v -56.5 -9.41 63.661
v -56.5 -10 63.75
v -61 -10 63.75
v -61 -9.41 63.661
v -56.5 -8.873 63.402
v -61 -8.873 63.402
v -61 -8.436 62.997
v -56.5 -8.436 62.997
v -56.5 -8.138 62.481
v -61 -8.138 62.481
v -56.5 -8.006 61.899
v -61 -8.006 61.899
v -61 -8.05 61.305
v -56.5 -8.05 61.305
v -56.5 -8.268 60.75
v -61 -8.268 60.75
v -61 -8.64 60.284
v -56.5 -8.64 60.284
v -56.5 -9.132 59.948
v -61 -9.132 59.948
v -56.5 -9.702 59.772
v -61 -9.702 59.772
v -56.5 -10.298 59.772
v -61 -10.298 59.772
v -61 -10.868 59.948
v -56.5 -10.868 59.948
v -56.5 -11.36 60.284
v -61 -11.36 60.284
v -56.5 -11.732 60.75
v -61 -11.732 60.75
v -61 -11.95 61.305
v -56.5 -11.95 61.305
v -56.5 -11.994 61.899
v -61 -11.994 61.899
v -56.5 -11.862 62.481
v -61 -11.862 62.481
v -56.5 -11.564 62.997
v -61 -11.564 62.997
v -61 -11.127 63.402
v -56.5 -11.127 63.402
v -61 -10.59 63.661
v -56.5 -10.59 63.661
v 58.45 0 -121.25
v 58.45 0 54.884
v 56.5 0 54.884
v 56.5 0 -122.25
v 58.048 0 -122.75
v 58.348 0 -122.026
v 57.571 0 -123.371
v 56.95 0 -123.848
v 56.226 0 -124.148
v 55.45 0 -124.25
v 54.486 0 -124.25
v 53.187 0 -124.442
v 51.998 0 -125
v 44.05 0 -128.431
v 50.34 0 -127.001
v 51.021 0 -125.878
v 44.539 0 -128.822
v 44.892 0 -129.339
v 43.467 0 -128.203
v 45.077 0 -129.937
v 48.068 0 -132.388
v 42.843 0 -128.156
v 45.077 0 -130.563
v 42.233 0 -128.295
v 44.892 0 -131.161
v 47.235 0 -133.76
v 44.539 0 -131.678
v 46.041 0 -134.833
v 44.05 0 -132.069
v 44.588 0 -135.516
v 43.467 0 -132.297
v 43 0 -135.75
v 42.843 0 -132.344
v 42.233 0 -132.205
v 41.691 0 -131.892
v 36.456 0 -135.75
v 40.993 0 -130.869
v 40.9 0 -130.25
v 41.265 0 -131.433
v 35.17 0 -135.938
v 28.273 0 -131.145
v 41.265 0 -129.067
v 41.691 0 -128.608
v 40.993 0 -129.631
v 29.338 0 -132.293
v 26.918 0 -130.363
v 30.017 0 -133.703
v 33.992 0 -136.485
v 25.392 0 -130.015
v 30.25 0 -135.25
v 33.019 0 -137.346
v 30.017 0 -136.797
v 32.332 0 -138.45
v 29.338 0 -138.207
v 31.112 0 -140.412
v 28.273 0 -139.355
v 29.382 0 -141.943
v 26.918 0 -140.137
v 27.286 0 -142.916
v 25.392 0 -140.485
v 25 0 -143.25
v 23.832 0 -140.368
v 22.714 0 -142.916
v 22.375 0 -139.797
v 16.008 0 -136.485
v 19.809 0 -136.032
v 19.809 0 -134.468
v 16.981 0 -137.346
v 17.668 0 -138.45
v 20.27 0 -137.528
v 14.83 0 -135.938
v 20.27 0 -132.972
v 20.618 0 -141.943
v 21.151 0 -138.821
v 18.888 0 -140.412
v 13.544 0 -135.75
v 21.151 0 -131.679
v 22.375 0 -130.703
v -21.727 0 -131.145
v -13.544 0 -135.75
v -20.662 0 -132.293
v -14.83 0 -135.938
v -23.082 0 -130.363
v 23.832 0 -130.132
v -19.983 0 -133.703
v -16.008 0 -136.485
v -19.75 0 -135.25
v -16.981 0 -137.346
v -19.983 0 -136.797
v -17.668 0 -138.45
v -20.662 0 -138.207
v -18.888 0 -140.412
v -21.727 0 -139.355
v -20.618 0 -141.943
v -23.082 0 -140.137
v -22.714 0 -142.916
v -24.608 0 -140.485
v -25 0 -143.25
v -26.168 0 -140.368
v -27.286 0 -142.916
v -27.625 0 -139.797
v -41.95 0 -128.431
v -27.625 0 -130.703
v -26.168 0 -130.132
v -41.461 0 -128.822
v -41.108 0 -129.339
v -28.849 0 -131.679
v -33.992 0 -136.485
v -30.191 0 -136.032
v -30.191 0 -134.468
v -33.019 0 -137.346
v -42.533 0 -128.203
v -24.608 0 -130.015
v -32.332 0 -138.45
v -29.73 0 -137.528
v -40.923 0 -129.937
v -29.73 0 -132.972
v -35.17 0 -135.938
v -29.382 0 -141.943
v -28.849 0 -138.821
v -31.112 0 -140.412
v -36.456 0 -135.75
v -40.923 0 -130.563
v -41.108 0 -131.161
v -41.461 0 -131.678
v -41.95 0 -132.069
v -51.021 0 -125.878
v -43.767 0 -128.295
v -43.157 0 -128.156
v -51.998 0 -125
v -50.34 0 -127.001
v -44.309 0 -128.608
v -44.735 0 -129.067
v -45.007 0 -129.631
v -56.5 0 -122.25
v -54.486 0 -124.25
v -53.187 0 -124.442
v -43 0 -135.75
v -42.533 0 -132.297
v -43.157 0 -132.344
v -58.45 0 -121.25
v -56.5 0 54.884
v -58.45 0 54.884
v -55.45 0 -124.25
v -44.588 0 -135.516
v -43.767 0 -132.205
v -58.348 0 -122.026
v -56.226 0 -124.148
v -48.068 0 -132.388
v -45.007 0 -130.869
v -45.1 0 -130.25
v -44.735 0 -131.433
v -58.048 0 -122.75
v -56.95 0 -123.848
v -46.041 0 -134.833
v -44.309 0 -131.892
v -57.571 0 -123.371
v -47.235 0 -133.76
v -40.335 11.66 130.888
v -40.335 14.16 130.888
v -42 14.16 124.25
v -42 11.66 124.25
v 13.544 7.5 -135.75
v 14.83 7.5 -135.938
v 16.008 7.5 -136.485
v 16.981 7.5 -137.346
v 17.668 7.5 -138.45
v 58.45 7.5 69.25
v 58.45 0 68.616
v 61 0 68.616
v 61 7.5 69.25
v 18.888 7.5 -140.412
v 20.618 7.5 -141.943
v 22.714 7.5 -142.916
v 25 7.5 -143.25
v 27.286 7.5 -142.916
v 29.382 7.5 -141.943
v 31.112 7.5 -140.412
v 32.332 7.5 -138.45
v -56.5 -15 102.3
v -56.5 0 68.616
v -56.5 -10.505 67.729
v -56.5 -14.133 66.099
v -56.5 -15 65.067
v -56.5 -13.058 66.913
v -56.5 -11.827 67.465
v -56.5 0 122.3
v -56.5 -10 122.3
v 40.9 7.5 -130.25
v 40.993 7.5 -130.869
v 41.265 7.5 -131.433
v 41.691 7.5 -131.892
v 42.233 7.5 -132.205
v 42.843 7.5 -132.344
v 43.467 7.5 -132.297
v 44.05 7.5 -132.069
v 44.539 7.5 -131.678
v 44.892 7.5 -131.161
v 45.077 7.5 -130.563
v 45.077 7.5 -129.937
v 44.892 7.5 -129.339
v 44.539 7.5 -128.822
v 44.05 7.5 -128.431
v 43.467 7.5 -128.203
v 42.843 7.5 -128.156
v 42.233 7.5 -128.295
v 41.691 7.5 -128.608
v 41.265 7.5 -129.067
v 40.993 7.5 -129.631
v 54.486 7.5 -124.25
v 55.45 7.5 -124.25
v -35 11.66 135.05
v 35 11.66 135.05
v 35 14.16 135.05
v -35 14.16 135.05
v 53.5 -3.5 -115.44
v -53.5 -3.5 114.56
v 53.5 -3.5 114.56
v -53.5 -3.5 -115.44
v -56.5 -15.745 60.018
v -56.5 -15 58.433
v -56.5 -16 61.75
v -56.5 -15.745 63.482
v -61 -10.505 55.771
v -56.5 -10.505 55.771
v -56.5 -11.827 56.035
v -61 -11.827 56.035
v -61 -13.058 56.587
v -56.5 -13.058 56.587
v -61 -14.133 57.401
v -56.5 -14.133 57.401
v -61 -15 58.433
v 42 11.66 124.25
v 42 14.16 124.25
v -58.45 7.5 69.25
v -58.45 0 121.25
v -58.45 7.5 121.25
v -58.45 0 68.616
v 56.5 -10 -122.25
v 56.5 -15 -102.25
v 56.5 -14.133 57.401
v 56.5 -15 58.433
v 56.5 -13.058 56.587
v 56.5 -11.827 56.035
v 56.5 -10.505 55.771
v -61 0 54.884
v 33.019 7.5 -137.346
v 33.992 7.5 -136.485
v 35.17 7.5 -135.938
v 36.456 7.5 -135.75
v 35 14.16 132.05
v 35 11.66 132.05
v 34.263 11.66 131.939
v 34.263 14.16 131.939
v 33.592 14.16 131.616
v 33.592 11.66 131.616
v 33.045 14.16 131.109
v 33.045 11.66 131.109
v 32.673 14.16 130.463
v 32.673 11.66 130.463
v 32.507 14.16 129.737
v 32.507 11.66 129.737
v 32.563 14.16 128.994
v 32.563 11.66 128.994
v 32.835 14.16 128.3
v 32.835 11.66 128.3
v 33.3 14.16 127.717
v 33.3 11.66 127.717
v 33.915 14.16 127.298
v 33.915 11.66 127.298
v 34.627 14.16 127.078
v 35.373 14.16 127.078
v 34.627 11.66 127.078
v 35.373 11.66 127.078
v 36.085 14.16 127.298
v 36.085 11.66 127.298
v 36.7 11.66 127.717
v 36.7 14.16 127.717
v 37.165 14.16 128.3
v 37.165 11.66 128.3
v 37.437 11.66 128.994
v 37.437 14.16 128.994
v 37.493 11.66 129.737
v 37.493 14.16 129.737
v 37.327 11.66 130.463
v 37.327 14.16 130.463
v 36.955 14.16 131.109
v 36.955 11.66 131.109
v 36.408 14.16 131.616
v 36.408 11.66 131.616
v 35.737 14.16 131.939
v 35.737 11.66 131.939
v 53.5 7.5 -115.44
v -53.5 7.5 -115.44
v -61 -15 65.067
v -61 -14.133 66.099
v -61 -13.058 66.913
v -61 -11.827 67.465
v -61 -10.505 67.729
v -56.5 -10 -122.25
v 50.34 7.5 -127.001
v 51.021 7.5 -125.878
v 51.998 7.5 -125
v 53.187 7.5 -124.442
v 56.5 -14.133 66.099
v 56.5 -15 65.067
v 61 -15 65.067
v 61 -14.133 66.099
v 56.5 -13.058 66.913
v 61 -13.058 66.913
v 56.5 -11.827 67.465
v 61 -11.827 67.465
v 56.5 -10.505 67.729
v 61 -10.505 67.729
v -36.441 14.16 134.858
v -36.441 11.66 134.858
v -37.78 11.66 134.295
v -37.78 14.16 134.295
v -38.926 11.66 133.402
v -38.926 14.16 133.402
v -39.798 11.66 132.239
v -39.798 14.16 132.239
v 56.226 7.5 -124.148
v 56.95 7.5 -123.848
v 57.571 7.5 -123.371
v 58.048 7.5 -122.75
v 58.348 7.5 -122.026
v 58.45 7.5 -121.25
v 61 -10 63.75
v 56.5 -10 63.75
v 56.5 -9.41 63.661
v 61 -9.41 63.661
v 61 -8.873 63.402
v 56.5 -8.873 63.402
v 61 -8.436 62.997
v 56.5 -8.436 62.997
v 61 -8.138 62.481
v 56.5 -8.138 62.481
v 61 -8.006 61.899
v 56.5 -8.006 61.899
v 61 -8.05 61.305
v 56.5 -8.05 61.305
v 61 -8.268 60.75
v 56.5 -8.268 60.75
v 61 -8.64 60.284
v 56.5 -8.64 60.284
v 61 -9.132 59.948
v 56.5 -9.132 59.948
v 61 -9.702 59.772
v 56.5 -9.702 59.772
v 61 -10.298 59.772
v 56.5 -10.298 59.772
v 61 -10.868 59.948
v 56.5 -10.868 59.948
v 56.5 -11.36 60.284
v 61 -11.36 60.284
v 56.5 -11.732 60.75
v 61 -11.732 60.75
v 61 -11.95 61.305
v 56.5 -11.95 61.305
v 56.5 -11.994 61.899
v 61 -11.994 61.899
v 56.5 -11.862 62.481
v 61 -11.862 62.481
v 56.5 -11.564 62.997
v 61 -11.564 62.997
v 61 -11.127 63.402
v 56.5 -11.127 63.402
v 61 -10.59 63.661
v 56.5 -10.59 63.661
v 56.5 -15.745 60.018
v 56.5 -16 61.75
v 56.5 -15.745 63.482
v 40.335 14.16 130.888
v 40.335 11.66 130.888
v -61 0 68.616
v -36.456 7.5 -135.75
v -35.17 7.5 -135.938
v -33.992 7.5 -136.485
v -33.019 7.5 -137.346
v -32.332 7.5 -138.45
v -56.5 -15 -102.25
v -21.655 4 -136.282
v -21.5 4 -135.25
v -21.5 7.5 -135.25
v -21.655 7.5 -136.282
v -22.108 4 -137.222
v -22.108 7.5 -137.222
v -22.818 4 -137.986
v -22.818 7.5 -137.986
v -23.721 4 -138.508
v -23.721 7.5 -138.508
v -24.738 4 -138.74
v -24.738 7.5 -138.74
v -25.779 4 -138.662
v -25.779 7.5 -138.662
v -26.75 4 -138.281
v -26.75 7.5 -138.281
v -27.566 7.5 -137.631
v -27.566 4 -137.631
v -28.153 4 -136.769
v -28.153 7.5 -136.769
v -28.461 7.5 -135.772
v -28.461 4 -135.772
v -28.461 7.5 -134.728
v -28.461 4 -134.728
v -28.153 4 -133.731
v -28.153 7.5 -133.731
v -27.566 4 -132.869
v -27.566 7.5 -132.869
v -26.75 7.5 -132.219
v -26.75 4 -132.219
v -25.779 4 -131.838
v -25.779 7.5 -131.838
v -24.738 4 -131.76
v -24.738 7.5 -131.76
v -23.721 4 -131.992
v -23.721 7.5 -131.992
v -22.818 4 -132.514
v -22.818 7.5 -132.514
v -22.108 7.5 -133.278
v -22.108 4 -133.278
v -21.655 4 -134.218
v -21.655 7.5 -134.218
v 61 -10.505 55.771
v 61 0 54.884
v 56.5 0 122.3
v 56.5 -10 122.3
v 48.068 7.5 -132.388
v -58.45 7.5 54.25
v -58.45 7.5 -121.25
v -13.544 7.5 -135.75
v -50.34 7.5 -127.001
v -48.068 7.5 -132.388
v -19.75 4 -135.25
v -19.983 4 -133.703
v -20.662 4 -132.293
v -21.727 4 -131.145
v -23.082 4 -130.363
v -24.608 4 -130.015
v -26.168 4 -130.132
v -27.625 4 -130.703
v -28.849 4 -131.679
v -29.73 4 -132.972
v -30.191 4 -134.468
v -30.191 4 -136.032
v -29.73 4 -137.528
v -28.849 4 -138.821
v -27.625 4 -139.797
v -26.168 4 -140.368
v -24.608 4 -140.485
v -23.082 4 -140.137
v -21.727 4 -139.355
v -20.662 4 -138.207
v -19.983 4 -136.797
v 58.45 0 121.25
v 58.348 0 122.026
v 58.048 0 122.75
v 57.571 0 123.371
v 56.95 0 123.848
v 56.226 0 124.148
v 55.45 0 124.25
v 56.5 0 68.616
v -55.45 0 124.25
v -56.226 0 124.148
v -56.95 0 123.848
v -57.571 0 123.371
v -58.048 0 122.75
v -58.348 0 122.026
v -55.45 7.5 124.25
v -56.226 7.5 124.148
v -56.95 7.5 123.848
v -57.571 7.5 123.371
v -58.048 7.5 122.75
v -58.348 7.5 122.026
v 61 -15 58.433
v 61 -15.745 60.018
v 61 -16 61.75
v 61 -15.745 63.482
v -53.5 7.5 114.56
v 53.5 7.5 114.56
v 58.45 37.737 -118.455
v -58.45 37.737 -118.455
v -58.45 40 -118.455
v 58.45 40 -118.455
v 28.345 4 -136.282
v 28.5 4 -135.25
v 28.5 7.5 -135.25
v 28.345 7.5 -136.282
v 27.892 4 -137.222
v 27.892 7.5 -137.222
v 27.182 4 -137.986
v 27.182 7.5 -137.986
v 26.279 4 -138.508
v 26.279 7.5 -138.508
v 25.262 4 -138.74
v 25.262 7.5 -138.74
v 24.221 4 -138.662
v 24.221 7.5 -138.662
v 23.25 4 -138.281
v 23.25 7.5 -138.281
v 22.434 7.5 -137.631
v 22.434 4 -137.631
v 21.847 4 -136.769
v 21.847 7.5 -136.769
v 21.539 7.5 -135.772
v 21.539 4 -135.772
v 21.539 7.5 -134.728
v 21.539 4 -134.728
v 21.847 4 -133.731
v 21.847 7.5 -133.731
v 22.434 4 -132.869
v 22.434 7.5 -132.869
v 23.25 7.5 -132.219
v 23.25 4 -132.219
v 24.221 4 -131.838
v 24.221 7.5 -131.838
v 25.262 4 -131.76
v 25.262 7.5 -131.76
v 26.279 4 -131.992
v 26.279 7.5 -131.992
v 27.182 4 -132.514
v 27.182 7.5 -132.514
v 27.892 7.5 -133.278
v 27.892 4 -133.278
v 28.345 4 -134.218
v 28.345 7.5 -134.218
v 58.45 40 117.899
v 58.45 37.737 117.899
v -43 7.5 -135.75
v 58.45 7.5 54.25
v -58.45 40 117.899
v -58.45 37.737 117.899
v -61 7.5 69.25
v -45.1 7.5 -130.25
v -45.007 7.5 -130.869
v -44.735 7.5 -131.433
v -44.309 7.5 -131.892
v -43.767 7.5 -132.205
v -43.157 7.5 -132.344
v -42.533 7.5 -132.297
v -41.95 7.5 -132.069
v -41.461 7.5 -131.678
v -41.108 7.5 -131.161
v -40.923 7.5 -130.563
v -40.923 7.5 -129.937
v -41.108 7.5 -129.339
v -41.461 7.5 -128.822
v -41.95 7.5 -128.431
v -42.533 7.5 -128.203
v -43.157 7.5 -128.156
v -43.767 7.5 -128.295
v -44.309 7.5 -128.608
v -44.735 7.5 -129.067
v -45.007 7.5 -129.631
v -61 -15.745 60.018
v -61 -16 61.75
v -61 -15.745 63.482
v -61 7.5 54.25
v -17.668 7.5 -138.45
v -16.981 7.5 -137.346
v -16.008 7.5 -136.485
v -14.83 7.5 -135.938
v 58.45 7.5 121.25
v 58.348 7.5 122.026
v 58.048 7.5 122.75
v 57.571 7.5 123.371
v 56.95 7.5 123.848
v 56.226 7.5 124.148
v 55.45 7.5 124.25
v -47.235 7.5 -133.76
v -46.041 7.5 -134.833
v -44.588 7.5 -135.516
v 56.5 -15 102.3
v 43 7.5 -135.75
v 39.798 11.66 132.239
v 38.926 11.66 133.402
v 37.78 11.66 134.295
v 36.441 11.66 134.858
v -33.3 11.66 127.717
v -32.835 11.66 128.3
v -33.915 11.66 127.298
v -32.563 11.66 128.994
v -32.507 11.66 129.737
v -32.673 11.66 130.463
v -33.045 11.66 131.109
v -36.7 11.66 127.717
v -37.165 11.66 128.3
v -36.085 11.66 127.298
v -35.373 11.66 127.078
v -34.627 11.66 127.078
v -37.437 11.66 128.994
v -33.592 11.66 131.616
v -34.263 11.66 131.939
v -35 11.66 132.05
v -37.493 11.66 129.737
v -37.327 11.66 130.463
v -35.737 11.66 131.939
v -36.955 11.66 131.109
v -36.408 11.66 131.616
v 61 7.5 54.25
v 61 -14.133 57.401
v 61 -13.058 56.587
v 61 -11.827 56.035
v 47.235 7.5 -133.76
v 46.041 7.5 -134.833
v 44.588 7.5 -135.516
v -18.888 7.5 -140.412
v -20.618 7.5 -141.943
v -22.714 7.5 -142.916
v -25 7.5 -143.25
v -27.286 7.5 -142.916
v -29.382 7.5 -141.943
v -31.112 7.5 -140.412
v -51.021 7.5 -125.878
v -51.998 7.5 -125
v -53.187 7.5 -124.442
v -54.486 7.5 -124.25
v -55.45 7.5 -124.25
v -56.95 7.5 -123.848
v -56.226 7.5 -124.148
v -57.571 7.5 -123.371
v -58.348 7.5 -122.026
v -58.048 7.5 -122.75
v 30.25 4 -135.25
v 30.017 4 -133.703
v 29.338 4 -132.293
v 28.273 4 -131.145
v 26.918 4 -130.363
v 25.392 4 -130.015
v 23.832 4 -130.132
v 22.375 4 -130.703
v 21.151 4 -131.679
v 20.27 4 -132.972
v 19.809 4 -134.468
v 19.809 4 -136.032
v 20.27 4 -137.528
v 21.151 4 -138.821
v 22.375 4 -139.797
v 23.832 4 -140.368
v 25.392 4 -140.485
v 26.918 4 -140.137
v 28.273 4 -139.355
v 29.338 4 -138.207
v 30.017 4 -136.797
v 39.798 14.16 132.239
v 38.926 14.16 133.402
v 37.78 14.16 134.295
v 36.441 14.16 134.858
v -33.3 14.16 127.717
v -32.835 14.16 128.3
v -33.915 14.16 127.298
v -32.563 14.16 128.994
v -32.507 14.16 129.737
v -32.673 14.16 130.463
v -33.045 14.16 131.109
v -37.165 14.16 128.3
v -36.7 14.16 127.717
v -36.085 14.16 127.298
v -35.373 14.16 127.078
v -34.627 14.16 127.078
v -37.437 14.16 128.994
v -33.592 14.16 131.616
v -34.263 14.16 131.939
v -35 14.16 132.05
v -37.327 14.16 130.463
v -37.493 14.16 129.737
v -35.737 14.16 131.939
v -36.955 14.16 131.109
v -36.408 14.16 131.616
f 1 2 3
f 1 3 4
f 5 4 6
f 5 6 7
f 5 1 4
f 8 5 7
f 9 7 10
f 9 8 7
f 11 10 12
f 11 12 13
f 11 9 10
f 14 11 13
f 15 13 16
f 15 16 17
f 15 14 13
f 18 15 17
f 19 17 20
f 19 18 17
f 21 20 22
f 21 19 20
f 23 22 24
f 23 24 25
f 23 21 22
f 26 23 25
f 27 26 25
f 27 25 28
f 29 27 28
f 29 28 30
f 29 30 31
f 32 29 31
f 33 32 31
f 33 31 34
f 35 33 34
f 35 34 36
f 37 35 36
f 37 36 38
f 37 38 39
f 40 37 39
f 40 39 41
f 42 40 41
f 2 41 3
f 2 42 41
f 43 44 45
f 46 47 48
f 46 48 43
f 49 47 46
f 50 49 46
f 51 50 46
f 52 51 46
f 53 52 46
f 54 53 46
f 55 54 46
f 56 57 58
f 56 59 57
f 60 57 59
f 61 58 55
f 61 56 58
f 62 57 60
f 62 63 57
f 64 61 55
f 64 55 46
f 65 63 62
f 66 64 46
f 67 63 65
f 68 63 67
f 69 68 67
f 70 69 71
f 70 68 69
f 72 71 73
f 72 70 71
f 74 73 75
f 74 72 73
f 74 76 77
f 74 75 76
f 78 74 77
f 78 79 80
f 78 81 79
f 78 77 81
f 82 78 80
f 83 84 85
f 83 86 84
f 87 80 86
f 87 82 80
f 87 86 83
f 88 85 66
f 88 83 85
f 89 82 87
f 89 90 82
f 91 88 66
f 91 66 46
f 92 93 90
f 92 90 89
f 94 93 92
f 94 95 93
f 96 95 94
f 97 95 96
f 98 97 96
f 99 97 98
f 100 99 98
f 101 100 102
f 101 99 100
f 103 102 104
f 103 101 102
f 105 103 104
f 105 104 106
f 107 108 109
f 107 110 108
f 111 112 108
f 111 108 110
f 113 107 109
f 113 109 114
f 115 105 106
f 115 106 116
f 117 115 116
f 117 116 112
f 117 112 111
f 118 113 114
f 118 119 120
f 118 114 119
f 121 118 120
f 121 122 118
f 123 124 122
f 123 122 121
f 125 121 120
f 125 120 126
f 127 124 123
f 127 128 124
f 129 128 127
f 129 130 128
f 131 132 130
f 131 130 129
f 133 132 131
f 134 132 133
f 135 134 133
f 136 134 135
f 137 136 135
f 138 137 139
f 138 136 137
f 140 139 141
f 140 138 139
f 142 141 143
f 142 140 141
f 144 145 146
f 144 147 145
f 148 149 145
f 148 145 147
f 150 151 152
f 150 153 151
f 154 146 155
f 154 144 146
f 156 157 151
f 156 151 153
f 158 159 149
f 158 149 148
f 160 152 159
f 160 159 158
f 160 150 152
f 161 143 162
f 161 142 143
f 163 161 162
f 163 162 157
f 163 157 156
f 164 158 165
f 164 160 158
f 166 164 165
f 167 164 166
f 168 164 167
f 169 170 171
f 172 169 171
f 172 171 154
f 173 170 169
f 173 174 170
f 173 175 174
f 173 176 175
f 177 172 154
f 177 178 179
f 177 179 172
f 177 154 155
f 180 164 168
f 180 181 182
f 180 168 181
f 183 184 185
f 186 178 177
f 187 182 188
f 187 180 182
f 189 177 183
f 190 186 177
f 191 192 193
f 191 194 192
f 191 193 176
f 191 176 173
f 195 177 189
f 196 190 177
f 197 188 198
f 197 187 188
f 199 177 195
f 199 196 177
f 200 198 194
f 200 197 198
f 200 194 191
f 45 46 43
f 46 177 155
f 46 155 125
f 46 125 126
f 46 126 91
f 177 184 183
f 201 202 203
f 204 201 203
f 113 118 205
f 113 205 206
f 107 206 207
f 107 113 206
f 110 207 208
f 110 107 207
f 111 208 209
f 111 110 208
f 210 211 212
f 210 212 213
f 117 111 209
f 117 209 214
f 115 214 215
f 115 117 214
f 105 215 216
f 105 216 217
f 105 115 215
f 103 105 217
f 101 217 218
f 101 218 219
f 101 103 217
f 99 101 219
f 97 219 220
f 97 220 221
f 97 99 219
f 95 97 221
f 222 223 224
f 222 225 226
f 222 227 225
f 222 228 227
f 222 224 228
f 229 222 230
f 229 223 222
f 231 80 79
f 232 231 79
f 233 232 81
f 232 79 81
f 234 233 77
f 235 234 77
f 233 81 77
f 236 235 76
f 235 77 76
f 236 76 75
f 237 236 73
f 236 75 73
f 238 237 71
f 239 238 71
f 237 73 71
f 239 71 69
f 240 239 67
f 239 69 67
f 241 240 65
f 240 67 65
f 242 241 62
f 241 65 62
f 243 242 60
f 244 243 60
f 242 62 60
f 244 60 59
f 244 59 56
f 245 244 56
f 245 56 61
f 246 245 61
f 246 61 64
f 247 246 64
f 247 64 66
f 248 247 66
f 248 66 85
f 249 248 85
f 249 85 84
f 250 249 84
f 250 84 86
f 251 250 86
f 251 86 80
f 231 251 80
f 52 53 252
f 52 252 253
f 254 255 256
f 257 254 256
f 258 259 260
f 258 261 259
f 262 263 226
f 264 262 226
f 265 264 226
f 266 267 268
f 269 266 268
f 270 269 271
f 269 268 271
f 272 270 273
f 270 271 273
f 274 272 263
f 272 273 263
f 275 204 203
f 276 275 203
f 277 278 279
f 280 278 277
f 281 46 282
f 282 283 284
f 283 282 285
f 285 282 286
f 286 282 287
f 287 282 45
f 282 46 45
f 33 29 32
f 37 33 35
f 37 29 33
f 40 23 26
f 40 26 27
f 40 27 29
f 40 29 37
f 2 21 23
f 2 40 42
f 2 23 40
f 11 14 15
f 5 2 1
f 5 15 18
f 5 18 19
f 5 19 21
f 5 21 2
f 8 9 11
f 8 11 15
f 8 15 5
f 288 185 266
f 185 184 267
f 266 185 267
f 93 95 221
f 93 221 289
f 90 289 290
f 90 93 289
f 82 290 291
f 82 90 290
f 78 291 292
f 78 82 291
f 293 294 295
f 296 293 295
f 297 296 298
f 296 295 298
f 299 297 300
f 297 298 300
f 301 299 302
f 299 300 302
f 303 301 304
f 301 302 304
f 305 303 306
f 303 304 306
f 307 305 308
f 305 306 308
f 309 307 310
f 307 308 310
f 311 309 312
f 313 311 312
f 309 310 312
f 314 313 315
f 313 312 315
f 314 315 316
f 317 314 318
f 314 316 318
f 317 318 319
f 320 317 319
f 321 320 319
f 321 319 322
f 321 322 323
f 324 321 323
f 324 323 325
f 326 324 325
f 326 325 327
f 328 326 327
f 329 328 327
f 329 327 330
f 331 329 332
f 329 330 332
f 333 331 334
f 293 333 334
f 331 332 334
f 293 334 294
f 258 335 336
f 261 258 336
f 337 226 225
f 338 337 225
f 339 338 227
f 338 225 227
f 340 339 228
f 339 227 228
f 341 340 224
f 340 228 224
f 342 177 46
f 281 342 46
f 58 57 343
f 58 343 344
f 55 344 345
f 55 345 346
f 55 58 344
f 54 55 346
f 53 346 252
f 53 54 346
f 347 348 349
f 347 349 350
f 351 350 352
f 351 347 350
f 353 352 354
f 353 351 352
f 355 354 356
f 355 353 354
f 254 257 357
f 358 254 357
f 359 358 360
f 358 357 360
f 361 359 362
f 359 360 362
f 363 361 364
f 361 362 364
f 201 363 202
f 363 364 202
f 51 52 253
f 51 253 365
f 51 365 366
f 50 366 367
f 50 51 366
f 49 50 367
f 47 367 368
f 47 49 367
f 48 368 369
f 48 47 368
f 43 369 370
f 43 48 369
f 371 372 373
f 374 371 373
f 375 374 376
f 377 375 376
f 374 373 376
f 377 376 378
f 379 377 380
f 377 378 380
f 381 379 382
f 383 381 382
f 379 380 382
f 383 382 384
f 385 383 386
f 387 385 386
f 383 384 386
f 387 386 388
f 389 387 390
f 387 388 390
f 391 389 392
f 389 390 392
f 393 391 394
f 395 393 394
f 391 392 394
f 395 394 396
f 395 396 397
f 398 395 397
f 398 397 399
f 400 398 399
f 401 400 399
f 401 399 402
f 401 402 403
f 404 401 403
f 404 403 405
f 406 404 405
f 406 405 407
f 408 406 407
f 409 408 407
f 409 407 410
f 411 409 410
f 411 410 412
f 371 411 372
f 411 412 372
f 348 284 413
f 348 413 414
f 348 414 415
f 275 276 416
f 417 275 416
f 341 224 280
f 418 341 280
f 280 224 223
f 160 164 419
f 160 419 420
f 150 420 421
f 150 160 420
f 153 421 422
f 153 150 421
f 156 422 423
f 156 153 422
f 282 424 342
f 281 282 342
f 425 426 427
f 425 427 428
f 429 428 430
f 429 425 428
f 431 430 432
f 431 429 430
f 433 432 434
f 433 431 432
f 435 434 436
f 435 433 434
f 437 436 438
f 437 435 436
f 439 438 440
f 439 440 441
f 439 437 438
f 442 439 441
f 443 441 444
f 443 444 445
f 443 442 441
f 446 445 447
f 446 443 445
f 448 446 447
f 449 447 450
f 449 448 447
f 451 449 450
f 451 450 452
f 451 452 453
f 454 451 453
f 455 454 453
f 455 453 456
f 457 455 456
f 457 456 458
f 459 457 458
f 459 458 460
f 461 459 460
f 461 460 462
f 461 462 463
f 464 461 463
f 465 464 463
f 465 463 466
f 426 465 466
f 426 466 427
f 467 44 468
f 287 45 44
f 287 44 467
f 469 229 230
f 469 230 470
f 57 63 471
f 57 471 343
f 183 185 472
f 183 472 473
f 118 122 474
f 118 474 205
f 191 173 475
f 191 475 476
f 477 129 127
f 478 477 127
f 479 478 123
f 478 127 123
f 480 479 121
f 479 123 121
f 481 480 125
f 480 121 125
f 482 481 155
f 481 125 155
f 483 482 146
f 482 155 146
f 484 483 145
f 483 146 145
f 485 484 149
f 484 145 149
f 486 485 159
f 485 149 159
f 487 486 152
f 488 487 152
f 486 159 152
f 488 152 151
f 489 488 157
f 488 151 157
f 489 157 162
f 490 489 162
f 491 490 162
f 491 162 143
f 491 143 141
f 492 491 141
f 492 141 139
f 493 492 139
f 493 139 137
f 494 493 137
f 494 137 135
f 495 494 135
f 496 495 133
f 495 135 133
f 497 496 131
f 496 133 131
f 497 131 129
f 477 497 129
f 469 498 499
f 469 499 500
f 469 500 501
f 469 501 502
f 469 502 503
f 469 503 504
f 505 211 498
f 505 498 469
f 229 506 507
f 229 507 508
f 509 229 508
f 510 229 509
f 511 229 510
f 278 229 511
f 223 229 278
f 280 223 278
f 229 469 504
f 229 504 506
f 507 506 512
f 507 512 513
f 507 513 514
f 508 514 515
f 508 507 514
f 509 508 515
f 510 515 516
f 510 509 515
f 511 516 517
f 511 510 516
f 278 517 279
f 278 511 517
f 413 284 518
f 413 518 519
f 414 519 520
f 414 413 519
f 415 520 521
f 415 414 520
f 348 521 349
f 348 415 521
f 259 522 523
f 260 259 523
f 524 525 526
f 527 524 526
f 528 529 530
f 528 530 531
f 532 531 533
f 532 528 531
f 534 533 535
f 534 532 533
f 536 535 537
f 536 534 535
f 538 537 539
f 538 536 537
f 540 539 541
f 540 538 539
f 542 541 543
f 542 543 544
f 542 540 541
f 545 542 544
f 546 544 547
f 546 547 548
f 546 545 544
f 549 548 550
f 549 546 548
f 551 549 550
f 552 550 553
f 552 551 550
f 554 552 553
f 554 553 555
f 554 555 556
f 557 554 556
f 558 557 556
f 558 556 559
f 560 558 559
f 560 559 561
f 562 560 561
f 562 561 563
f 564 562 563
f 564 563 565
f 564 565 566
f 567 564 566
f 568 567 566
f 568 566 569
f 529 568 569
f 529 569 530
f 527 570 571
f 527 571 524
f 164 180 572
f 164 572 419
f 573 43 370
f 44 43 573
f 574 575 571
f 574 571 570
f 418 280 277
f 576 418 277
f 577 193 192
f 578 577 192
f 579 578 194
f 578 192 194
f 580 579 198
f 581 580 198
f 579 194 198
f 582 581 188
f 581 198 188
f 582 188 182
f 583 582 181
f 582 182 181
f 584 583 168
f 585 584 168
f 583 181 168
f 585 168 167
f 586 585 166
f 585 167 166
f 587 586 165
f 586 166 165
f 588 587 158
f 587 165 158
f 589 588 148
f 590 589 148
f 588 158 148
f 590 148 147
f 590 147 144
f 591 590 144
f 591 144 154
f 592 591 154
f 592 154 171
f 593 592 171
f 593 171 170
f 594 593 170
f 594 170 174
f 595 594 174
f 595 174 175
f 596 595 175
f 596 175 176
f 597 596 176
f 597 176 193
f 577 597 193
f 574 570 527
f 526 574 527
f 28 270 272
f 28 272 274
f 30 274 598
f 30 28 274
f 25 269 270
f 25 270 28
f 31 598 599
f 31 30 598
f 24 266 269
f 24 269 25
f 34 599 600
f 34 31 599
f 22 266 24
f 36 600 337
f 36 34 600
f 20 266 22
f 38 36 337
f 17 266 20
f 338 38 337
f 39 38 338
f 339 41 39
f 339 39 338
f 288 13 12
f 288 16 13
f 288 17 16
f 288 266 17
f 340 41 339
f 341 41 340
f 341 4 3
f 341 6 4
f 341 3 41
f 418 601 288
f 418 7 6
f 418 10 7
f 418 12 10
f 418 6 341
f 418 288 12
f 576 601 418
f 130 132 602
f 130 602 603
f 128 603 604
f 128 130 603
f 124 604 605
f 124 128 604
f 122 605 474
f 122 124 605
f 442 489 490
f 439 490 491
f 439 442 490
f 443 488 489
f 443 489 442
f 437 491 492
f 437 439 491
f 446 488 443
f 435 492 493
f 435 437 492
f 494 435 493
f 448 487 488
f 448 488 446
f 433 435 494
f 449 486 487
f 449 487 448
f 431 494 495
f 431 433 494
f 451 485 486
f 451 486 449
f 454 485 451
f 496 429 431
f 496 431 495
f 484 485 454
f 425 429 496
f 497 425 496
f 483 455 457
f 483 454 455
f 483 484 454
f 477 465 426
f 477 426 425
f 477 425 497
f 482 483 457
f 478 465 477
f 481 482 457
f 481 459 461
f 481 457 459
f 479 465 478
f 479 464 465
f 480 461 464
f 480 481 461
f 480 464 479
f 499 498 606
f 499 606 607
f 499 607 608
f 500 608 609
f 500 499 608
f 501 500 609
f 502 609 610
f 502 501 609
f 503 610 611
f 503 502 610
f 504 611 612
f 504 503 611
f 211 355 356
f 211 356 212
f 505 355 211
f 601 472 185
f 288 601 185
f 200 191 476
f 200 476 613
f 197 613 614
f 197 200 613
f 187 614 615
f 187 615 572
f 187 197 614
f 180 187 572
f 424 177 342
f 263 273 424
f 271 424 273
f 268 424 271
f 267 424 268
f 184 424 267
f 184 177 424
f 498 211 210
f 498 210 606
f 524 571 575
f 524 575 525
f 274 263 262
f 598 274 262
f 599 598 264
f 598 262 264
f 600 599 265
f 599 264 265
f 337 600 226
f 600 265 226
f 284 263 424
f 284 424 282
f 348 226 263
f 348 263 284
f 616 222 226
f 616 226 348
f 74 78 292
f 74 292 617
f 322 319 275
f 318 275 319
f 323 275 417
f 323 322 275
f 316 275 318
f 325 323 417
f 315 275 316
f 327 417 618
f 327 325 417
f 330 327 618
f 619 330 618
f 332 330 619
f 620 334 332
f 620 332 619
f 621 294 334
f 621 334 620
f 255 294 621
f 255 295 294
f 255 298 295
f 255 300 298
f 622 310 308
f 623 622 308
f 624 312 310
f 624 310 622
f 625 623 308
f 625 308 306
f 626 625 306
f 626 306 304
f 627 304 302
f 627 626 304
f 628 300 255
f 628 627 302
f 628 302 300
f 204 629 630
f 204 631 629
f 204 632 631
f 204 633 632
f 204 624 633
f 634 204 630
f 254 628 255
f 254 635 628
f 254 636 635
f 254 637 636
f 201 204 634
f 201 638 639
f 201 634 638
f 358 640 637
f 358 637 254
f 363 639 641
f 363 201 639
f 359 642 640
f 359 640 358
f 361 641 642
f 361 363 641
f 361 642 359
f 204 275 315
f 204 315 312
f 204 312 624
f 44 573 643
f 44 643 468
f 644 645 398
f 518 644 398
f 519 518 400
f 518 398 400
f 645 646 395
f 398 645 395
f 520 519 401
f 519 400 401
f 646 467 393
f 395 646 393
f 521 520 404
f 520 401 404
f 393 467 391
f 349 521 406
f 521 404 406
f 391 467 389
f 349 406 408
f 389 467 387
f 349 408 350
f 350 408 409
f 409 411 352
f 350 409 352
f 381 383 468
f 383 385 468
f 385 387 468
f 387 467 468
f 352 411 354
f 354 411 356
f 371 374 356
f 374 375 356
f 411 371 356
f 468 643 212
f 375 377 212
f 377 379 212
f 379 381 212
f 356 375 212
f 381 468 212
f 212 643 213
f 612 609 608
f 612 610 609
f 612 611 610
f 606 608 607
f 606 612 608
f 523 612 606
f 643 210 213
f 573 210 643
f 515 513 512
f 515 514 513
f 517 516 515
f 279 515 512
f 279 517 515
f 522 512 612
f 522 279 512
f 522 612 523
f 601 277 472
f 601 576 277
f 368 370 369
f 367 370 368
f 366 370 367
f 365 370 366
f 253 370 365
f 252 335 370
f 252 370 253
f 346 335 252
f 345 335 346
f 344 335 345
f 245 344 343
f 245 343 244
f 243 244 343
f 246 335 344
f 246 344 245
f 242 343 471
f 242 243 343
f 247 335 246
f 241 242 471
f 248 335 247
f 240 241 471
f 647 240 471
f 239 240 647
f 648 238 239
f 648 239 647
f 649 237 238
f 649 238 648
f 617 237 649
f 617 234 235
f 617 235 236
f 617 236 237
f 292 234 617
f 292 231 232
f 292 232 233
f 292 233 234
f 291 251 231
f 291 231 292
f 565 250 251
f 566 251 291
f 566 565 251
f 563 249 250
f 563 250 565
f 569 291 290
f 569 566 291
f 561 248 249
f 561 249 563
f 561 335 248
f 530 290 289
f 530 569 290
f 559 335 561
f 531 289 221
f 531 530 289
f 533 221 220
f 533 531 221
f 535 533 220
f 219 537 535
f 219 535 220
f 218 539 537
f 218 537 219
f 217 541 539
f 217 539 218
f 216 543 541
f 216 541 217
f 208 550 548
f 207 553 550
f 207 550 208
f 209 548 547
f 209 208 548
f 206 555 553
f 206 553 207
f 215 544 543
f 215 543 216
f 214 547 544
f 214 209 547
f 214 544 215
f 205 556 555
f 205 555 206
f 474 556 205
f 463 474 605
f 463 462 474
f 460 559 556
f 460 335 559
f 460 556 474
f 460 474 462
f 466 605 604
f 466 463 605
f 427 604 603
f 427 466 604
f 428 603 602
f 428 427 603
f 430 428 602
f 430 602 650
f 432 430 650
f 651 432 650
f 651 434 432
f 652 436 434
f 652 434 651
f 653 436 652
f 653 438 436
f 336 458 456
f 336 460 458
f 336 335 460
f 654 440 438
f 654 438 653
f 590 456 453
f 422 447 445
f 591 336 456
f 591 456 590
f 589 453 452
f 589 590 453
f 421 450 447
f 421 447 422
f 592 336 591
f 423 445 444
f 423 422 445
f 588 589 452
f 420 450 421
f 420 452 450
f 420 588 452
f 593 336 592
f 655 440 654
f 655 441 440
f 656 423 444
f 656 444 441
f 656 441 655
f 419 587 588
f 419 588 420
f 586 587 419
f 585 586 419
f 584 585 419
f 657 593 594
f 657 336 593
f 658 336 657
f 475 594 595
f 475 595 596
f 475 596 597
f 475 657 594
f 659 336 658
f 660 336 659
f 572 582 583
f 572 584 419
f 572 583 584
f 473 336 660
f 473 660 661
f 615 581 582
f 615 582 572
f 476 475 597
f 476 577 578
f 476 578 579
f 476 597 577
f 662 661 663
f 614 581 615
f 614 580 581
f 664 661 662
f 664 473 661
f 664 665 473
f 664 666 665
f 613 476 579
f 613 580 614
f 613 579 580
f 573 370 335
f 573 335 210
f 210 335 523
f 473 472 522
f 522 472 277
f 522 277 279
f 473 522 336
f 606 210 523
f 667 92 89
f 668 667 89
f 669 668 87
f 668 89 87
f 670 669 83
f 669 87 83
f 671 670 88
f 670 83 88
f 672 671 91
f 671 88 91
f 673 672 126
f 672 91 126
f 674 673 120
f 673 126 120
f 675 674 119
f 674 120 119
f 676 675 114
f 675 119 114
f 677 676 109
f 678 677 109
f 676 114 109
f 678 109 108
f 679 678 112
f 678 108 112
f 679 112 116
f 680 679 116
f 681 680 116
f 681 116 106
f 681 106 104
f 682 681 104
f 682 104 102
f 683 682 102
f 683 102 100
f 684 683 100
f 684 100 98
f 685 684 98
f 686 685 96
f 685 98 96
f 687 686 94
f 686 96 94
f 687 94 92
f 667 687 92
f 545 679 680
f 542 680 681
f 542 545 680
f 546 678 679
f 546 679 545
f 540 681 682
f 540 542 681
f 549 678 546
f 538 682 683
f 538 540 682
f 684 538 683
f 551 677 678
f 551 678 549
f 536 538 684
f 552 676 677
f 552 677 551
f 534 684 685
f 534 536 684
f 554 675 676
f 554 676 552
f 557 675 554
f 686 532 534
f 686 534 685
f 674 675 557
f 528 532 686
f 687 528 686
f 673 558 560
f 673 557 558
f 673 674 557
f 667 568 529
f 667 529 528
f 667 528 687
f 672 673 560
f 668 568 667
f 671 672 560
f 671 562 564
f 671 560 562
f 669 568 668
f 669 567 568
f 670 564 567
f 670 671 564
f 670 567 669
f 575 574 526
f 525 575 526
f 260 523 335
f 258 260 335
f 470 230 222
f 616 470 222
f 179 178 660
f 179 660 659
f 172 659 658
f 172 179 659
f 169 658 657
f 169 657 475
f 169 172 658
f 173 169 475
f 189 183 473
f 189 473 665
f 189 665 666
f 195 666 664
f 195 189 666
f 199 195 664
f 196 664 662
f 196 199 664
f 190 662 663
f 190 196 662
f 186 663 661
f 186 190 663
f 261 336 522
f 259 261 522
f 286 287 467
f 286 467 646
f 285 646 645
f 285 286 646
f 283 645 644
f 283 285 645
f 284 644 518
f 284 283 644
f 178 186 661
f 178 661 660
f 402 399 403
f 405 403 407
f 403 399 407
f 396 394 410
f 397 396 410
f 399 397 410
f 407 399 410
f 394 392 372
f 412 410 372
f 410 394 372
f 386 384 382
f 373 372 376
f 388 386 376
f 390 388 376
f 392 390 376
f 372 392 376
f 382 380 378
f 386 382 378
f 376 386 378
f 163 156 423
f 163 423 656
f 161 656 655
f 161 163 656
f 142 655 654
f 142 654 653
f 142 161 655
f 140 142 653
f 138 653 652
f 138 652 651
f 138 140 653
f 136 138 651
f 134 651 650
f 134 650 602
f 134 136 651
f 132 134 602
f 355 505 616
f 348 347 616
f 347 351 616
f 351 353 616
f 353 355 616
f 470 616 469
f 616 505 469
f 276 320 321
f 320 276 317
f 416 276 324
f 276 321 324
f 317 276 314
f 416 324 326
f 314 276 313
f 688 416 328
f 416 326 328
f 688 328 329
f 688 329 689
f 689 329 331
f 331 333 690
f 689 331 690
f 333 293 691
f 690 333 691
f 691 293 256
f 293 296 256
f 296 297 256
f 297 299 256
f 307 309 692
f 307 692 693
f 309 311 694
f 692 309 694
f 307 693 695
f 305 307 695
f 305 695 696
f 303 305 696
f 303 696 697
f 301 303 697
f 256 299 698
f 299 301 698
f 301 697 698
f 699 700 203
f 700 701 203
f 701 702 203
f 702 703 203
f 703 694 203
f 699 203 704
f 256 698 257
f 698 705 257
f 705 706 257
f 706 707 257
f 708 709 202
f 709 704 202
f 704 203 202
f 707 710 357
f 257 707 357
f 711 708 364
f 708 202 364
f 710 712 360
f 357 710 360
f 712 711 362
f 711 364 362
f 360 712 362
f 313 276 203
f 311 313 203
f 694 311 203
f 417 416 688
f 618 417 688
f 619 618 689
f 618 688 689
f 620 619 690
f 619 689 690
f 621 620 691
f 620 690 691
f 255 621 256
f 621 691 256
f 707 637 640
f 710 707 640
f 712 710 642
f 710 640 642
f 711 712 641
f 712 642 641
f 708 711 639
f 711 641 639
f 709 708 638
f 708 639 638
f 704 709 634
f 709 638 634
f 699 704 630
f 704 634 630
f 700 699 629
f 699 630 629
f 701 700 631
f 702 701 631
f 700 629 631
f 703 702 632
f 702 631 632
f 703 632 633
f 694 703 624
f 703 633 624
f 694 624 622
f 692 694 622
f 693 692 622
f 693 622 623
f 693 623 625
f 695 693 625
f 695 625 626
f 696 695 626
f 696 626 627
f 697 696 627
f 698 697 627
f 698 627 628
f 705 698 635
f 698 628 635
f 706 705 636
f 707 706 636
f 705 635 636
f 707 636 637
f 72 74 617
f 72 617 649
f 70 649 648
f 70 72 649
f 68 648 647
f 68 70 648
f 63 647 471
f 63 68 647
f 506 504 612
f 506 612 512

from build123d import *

# Parameters (mm, degrees)
SKETCH_2_R          = 3.5
SKETCH_2_R_2        = 1.75
EXTRUDE_1_DEPTH     = 7.5
SKETCH_3_R          = 5.25
CUT_EXTRUDE_1_DEPTH = 4
HOLE_WIZARD_M5_1_D  = 4.2
SKETCH_6_W          = 113
SKETCH_6_H          = 244.55
EXTRUDE_2_DEPTH     = 15
SKETCH_7_R          = 2
EXTRUDE_4_DEPTH     = 4.5
EXTRUDE_START       = -113
SKETCH_7_4_R        = 2
EXTRUDE_5_DEPTH     = 4.5
SKETCH_8_W          = 10.8
SKETCH_8_H          = 2.5
EXTRUDE_6_DEPTH     = 110
CUT_EXTRUDE_2_DEPTH = 110
SKETCH_11_W         = 2.5
SKETCH_11_H         = 30.16
MM_1_AT_2_COUNT     = 2
MM_1_AT_2_PITCH     = 70
CUT_EXTRUDE_3_DEPTH = 118.5
SKETCH_13_W         = 236.353812636
SKETCH_13_H         = 2.262628903
EXTRUDE_7_DEPTH     = 116.9
CUT_EXTRUDE_4_DEPTH = 11


with BuildPart() as part:
    # 草图2 → 凸台-拉伸1 (new body)
    with BuildSketch(Plane(origin=(0, 0, 0), x_dir=(1, 0, 0), z_dir=(0, 1, 0))):
        with BuildLine():
            Line((-43, 135.75), (-36.456439237, 135.75))
            ThreePointArc((-36.456439237, 135.75), (-33.991687729, 136.485029881), (-32.332121112, 138.45))
            ThreePointArc((-32.332121112, 138.45), (-25, 143.25), (-17.667878888, 138.45))
            ThreePointArc((-17.667878888, 138.45), (-16.008312271, 136.485029881), (-13.543560763, 135.75))
            Line((-13.543560763, 135.75), (13.543560763, 135.75))
            ThreePointArc((13.543560763, 135.75), (16.008312271, 136.485029881), (17.667878888, 138.45))
            ThreePointArc((17.667878888, 138.45), (25, 143.25), (32.332121112, 138.45))
            ThreePointArc((32.332121112, 138.45), (33.991687729, 136.485029881), (36.456439237, 135.75))
            Line((36.456439237, 135.75), (43, 135.75))
            ThreePointArc((43, 135.75), (46.040865614, 134.832917882), (48.067649964, 132.387504115))
            Line((48.067649964, 132.387504115), (50.339588736, 127.001132996))
            ThreePointArc((50.339588736, 127.001132996), (51.99786684, 125.000339914), (54.485847797, 124.25))
            Line((54.485847797, 124.25), (55.45, 124.25))
            ThreePointArc((55.45, 124.25), (57.571320344, 123.371320344), (58.45, 121.25))
            Line((58.45, 121.25), (58.45, -121.25))
            ThreePointArc((58.45, -121.25), (57.571320344, -123.371320344), (55.45, -124.25))
            Line((55.45, -124.25), (-55.45, -124.25))
            ThreePointArc((-55.45, -124.25), (-57.571320344, -123.371320344), (-58.45, -121.25))
            Line((-58.45, -121.25), (-58.45, 121.25))
            ThreePointArc((-58.45, 121.25), (-57.571320344, 123.371320344), (-55.45, 124.25))
            Line((-55.45, 124.25), (-54.485847797, 124.25))
            ThreePointArc((-54.485847797, 124.25), (-51.99786684, 125.000339914), (-50.339588736, 127.001132996))
            Line((-50.339588736, 127.001132996), (-48.067649964, 132.387504115))
            ThreePointArc((-48.067649964, 132.387504115), (-46.040865614, 134.832917882), (-43, 135.75))
        make_face()
        with Locations((-25, 135.25)):
            Circle(SKETCH_2_R, mode=Mode.SUBTRACT)
        with Locations((25, 135.25)):
            Circle(SKETCH_2_R, mode=Mode.SUBTRACT)
        with Locations((-43, 130.25)):
            Circle(SKETCH_2_R_2, mode=Mode.SUBTRACT)
        with Locations((43, 130.25)):
            Circle(SKETCH_2_R_2, mode=Mode.SUBTRACT)
    extrude(amount=EXTRUDE_1_DEPTH)

    # 草图3 → 切除-拉伸1 (cut)
    with BuildSketch(Plane.XZ):
        with Locations((25, -135.25)):
            Circle(SKETCH_3_R)
        with Locations((-25, -135.25)):
            Circle(SKETCH_3_R)
    extrude(amount=-CUT_EXTRUDE_1_DEPTH, mode=Mode.SUBTRACT)

    # M5 螺纹孔1 (through all)
    with Locations(Plane(origin=(0, 7.5, 0), x_dir=(1, 0, 0), z_dir=(0, 1, 0))):
        with Locations((-43, 130.25), (43, 130.25)):
            Hole(HOLE_WIZARD_M5_1_D / 2)

    # 草图6 → 凸台-拉伸2 (add)
    with BuildSketch(Plane.XZ):
        with Locations((0, 0.025)):
            Rectangle(SKETCH_6_W, SKETCH_6_H)
    extrude(amount=EXTRUDE_2_DEPTH)

    # 草图7 → 凸台-拉伸4 (add)
    with BuildSketch(Plane.ZY.offset(56.5)):
        with BuildLine():
            Line((68.616305254, 0), (54.883694746, 0))
            Line((54.883694746, 0), (55.771303021, -10.505155848))
            ThreePointArc((55.771303021, -10.505155848), (61.497197582, -4.005328121), (67.75, -10))
            ThreePointArc((67.75, -10), (67.744671879, -10.252802418), (67.728696979, -10.505155848))
            Line((67.728696979, -10.505155848), (68.616305254, 0))
        make_face()
        with BuildLine():
            ThreePointArc((67.75, -10), (61.497197582, -4.005328121), (55.771303021, -10.505155848))
            ThreePointArc((55.771303021, -10.505155848), (56.587475648, -13.057505897), (58.43337521, -15))
            Line((58.43337521, -15), (65.06662479, -15))
            ThreePointArc((65.06662479, -15), (66.912524352, -13.057505897), (67.728696979, -10.505155848))
            ThreePointArc((67.728696979, -10.505155848), (67.744671879, -10.252802418), (67.75, -10))
        make_face()
        with Locations((61.75, -10)):
            Circle(SKETCH_7_R, mode=Mode.SUBTRACT)
        Polygon((69.25, 7.5), (54.25, 7.5), (54.883694746, 0), (68.616305254, 0), align=None)
        with BuildLine():
            Line((65.06662479, -15), (58.43337521, -15))
            ThreePointArc((58.43337521, -15), (61.75, -16), (65.06662479, -15))
        make_face()
    extrude(amount=EXTRUDE_4_DEPTH)

    # 草图7<4> → 凸台-拉伸5 (add)
    with BuildSketch(Plane.ZY.offset(56.5).offset(EXTRUDE_START)):
        with BuildLine():
            Line((68.616305254, 0), (54.883694746, 0))
            Line((54.883694746, 0), (55.771303021, -10.505155848))
            ThreePointArc((55.771303021, -10.505155848), (61.497197582, -4.005328121), (67.75, -10))
            ThreePointArc((67.75, -10), (67.744671879, -10.252802418), (67.728696979, -10.505155848))
            Line((67.728696979, -10.505155848), (68.616305254, 0))
        make_face()
        with BuildLine():
            ThreePointArc((67.75, -10), (61.497197582, -4.005328121), (55.771303021, -10.505155848))
            ThreePointArc((55.771303021, -10.505155848), (56.587475648, -13.057505897), (58.43337521, -15))
            Line((58.43337521, -15), (65.06662479, -15))
            ThreePointArc((65.06662479, -15), (66.912524352, -13.057505897), (67.728696979, -10.505155848))
            ThreePointArc((67.728696979, -10.505155848), (67.744671879, -10.252802418), (67.75, -10))
        make_face()
        with Locations((61.75, -10)):
            Circle(SKETCH_7_4_R, mode=Mode.SUBTRACT)
        Polygon((69.25, 7.5), (54.25, 7.5), (54.883694746, 0), (68.616305254, 0), align=None)
        with BuildLine():
            Line((65.06662479, -15), (58.43337521, -15))
            ThreePointArc((58.43337521, -15), (61.75, -16), (65.06662479, -15))
        make_face()
    extrude(amount=-EXTRUDE_5_DEPTH)

    # 草图12 → 切除-拉伸3 (cut, through all)
    with BuildSketch(Plane.ZY.offset(56.5)):
        Polygon((122.3, -10), (102.3, -15), (122.3, -15), align=None)
        Polygon((-102.25, -15), (-122.25, -10), (-122.25, -15), align=None)
    extrude(amount=-CUT_EXTRUDE_3_DEPTH, mode=Mode.SUBTRACT)

    # 草图14 → 切除-拉伸4 (cut)
    with BuildSketch(Plane(origin=(0, 7.5, 0), x_dir=(1, 0, 0), z_dir=(0, 1, 0))):
        Polygon((-53.5, -114.559708527), (53.5, -114.559708527), (53.5, -102.3), (53.5, -65.06662479), (53.5, -58.43337521), (53.5, 102.25), (53.5, 115.440291473), (-53.5, 115.440291473), (-53.5, 102.25), (-53.5, -58.43337521), (-53.5, -65.06662479), (-53.5, -102.3), align=None)
    extrude(amount=-CUT_EXTRUDE_4_DEPTH, mode=Mode.SUBTRACT)


with BuildPart() as body_2:
    # 草图8 → 凸台-拉伸6 (new body)
    with BuildSketch(Plane.ZY.offset(58.45)):
        with Locations((129.65, 12.91)):
            Rectangle(SKETCH_8_W, SKETCH_8_H)
    extrude(amount=-EXTRUDE_6_DEPTH)

    # 草图9 → 切除-拉伸2 (cut)
    with BuildSketch(Plane(origin=(0, 14.16, 0), x_dir=(1, 0, 0), z_dir=(0, 1, 0))):
        with BuildLine():
            Line((-40.334698203, -130.888280645), (-42, -124.25))
            Line((-42, -124.25), (-58.45, -124.25))
            Line((-58.45, -124.25), (-58.45, -135.05))
            Line((-58.45, -135.05), (-35, -135.05))
            ThreePointArc((-35, -135.05), (-38.383005797, -133.886504557), (-40.334698203, -130.888280645))
        make_face()
        with BuildLine():
            ThreePointArc((40.334698203, -130.888280645), (38.383005797, -133.886504557), (35, -135.05))
            Line((35, -135.05), (51.55, -135.05))
            Line((51.55, -135.05), (51.55, -124.25))
            Line((51.55, -124.25), (42, -124.25))
            Line((42, -124.25), (40.334698203, -130.888280645))
        make_face()
    extrude(amount=-CUT_EXTRUDE_2_DEPTH, mode=Mode.SUBTRACT)

    # 草图11 → 大小mm 暗销孔1 (revolve, cut)
    with BuildSketch(Plane(origin=(-35, 14.16, 129.55), x_dir=(0, 0, 1), z_dir=(1, 0, 0))):
        with Locations((1.25, 15.08)):
            Rectangle(SKETCH_11_W, SKETCH_11_H)
    mm_1 = revolve(axis=Axis((-35, 20.51, 129.55), (0, -1, 0)), mode=Mode.SUBTRACT)

    # 大小mm 暗销孔1 at 2: 大小mm 暗销孔1 ×2
    with Locations(*[(i * MM_1_AT_2_PITCH, 0, 0) for i in range(1, MM_1_AT_2_COUNT)]):
        add(mm_1, mode=Mode.SUBTRACT)


with BuildPart() as body_3:
    # 草图13 → 凸台-拉伸7 (new body)
    with BuildSketch(Plane(origin=(58.45, 0, 0), x_dir=(0, 0, -1), z_dir=(1, 0, 0))):
        with Locations((0.278358751, 38.868685548)):
            Rectangle(SKETCH_13_W, SKETCH_13_H)
    extrude(amount=-EXTRUDE_7_DEPTH)


solid = Compound([part.part, body_2.part, body_3.part])
